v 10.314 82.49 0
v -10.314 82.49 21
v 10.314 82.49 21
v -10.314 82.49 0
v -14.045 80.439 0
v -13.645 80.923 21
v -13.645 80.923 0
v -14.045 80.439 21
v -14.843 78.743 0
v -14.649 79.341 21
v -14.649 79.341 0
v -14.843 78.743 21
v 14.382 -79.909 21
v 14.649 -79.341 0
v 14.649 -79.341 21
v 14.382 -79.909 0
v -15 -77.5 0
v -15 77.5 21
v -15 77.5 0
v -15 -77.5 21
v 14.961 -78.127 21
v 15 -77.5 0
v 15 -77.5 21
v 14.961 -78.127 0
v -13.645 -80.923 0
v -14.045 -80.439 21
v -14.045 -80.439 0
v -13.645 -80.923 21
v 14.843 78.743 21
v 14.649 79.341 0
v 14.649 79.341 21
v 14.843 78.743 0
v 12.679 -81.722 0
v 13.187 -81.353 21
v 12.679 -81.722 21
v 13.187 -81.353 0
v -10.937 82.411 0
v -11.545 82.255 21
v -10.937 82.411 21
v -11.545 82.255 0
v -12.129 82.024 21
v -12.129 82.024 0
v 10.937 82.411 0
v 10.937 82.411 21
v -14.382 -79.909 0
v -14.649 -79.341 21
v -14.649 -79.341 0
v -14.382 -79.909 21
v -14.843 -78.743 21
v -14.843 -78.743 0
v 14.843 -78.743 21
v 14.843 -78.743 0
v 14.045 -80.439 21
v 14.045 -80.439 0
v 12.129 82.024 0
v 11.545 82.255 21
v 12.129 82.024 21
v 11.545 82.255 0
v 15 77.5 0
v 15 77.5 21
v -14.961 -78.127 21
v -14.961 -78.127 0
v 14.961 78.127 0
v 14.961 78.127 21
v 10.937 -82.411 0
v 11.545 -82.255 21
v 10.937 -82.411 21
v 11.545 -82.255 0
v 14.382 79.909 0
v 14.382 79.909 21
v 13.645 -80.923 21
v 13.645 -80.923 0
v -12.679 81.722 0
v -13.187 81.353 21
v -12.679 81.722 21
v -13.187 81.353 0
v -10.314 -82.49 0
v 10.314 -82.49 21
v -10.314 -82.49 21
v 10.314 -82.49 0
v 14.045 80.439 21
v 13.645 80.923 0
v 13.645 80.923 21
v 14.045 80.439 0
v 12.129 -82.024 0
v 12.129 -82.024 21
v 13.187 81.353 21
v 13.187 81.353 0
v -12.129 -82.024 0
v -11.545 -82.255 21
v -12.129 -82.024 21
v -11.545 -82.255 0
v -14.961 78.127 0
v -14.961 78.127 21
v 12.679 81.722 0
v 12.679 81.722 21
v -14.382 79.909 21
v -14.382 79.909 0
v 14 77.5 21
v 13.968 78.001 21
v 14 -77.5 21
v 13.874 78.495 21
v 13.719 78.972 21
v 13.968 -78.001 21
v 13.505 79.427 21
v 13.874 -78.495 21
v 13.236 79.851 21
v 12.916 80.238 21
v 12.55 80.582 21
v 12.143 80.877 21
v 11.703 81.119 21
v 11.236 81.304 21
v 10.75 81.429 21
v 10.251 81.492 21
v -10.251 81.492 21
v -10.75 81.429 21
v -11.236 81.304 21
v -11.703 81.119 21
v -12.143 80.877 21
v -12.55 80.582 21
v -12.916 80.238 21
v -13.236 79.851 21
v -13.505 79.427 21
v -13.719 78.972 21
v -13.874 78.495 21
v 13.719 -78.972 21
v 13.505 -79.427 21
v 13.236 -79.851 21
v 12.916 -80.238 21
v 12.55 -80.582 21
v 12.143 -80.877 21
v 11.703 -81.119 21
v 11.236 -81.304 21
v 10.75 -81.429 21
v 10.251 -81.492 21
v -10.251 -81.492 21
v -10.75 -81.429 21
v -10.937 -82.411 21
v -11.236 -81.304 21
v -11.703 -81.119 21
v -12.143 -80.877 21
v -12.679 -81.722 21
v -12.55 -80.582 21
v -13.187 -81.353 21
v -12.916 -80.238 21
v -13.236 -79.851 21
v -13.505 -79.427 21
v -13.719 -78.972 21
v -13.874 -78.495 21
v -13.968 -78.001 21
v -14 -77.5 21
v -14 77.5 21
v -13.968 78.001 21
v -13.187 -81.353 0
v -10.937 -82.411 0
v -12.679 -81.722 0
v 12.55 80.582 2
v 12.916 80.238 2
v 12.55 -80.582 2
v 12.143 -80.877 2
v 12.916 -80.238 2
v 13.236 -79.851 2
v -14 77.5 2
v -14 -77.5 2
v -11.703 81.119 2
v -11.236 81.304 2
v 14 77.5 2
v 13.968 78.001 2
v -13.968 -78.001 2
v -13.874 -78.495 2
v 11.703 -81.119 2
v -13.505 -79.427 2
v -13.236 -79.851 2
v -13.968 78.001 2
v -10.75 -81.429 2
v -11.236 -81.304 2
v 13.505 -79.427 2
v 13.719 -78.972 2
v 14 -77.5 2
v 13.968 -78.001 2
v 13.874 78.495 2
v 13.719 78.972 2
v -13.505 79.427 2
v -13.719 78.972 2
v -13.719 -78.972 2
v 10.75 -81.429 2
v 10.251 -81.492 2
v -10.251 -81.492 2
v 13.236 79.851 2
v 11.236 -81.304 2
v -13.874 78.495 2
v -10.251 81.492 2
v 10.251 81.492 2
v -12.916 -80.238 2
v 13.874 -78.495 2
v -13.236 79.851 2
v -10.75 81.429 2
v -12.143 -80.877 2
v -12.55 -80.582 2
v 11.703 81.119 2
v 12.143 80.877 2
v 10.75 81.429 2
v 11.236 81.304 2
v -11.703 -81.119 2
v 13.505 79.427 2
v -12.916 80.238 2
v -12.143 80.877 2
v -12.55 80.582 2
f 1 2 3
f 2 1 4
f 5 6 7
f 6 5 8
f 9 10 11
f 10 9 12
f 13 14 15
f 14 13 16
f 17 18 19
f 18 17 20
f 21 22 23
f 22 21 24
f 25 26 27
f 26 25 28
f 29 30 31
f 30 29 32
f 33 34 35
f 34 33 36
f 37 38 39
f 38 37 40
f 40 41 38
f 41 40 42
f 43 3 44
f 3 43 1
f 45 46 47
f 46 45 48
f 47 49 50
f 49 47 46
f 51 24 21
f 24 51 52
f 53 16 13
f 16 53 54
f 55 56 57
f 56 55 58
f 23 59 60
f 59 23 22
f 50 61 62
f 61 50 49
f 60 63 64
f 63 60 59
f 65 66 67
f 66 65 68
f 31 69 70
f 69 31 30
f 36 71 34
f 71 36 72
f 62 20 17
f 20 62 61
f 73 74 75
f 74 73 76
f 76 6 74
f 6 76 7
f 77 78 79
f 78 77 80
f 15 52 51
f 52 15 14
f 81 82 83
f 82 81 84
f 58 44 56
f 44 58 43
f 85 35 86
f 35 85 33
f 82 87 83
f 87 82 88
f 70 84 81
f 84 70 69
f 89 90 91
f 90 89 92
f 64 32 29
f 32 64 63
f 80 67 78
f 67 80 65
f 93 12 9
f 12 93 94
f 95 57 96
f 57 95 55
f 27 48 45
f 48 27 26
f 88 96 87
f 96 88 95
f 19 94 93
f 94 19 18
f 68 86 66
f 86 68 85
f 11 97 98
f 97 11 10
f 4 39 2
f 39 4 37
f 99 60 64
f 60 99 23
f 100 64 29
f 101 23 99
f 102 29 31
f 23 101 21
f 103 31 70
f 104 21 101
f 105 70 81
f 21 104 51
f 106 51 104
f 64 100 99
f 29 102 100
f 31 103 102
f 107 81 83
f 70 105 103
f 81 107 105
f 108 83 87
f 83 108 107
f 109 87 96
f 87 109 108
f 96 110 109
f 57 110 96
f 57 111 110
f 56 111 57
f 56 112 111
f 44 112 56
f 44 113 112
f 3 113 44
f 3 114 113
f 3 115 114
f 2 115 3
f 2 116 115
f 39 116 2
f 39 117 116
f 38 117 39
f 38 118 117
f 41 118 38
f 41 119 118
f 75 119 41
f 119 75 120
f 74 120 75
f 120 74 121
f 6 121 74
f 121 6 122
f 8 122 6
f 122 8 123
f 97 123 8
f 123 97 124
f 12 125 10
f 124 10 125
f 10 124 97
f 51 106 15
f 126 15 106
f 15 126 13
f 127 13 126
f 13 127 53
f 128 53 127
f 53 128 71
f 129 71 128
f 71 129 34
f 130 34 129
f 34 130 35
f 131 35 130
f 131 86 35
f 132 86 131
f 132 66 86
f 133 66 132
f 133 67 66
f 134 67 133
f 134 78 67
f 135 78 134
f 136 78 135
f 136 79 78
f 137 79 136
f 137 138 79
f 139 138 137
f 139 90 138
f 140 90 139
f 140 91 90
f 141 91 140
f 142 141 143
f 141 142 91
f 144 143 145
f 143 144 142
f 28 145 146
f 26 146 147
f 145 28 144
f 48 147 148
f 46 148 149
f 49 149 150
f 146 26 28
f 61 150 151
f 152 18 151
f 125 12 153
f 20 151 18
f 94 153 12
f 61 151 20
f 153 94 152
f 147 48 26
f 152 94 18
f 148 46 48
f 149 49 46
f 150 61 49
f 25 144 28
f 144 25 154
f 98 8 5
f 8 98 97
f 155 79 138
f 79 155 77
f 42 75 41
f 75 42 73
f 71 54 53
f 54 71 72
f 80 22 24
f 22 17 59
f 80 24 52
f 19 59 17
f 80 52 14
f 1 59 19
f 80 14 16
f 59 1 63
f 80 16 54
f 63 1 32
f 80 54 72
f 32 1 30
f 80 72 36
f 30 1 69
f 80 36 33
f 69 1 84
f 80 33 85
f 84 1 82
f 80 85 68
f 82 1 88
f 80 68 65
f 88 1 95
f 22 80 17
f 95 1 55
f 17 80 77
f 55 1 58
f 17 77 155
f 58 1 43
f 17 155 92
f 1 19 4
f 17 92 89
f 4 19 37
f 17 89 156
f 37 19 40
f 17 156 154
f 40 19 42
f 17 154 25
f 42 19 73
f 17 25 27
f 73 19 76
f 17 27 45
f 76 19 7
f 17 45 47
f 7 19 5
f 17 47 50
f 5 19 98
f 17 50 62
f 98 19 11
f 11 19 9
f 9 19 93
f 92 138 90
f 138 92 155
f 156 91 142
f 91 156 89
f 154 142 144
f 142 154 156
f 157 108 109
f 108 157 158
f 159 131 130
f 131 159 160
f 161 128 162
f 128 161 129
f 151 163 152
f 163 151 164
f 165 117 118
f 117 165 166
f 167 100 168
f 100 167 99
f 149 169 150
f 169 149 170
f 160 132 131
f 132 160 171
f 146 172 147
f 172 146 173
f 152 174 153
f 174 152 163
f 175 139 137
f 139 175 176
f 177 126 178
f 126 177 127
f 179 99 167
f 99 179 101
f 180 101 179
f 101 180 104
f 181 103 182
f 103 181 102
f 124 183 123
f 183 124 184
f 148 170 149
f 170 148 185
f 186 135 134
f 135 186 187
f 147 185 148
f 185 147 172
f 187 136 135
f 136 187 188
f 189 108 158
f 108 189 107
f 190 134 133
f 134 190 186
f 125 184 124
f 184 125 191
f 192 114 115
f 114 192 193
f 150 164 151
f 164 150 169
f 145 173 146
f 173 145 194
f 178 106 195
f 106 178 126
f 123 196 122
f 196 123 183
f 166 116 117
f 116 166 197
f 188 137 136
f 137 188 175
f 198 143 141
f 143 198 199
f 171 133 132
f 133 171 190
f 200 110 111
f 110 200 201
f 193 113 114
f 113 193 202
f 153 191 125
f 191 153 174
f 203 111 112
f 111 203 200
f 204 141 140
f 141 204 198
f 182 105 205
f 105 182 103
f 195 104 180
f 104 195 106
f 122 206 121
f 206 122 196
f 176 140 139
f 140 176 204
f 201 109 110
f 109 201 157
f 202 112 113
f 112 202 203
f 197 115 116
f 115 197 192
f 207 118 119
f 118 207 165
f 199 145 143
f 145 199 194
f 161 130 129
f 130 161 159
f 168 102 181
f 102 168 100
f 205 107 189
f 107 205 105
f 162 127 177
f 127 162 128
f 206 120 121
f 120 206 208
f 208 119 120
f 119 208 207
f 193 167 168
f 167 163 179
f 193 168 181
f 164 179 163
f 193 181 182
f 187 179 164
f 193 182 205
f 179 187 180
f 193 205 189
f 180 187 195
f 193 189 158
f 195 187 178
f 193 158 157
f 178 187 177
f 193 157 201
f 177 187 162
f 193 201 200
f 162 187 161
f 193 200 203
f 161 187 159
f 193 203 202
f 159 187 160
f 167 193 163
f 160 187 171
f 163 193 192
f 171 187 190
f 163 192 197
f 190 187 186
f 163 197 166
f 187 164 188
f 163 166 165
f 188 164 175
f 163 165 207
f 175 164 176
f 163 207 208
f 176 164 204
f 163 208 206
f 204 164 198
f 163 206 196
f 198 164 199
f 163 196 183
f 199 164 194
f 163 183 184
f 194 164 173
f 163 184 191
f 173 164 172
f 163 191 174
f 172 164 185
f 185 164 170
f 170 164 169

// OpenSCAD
$fn = 50;


difference() {
	union() {
		hull() {
			translate(v = [-10.0000000000, 77.5000000000, 0]) {
				cylinder(h = 21, r = 5);
			}
			translate(v = [10.0000000000, 77.5000000000, 0]) {
				cylinder(h = 21, r = 5);
			}
			translate(v = [-10.0000000000, -77.5000000000, 0]) {
				cylinder(h = 21, r = 5);
			}
			translate(v = [10.0000000000, -77.5000000000, 0]) {
				cylinder(h = 21, r = 5);
			}
		}
	}
	union() {
		translate(v = [0, 0, 2]) {
			hull() {
				translate(v = [-10.0000000000, 77.5000000000, 0]) {
					cylinder(h = 19, r = 4);
				}
				translate(v = [10.0000000000, 77.5000000000, 0]) {
					cylinder(h = 19, r = 4);
				}
				translate(v = [-10.0000000000, -77.5000000000, 0]) {
					cylinder(h = 19, r = 4);
				}
				translate(v = [10.0000000000, -77.5000000000, 0]) {
					cylinder(h = 19, r = 4);
				}
			}
		}
	}
}
